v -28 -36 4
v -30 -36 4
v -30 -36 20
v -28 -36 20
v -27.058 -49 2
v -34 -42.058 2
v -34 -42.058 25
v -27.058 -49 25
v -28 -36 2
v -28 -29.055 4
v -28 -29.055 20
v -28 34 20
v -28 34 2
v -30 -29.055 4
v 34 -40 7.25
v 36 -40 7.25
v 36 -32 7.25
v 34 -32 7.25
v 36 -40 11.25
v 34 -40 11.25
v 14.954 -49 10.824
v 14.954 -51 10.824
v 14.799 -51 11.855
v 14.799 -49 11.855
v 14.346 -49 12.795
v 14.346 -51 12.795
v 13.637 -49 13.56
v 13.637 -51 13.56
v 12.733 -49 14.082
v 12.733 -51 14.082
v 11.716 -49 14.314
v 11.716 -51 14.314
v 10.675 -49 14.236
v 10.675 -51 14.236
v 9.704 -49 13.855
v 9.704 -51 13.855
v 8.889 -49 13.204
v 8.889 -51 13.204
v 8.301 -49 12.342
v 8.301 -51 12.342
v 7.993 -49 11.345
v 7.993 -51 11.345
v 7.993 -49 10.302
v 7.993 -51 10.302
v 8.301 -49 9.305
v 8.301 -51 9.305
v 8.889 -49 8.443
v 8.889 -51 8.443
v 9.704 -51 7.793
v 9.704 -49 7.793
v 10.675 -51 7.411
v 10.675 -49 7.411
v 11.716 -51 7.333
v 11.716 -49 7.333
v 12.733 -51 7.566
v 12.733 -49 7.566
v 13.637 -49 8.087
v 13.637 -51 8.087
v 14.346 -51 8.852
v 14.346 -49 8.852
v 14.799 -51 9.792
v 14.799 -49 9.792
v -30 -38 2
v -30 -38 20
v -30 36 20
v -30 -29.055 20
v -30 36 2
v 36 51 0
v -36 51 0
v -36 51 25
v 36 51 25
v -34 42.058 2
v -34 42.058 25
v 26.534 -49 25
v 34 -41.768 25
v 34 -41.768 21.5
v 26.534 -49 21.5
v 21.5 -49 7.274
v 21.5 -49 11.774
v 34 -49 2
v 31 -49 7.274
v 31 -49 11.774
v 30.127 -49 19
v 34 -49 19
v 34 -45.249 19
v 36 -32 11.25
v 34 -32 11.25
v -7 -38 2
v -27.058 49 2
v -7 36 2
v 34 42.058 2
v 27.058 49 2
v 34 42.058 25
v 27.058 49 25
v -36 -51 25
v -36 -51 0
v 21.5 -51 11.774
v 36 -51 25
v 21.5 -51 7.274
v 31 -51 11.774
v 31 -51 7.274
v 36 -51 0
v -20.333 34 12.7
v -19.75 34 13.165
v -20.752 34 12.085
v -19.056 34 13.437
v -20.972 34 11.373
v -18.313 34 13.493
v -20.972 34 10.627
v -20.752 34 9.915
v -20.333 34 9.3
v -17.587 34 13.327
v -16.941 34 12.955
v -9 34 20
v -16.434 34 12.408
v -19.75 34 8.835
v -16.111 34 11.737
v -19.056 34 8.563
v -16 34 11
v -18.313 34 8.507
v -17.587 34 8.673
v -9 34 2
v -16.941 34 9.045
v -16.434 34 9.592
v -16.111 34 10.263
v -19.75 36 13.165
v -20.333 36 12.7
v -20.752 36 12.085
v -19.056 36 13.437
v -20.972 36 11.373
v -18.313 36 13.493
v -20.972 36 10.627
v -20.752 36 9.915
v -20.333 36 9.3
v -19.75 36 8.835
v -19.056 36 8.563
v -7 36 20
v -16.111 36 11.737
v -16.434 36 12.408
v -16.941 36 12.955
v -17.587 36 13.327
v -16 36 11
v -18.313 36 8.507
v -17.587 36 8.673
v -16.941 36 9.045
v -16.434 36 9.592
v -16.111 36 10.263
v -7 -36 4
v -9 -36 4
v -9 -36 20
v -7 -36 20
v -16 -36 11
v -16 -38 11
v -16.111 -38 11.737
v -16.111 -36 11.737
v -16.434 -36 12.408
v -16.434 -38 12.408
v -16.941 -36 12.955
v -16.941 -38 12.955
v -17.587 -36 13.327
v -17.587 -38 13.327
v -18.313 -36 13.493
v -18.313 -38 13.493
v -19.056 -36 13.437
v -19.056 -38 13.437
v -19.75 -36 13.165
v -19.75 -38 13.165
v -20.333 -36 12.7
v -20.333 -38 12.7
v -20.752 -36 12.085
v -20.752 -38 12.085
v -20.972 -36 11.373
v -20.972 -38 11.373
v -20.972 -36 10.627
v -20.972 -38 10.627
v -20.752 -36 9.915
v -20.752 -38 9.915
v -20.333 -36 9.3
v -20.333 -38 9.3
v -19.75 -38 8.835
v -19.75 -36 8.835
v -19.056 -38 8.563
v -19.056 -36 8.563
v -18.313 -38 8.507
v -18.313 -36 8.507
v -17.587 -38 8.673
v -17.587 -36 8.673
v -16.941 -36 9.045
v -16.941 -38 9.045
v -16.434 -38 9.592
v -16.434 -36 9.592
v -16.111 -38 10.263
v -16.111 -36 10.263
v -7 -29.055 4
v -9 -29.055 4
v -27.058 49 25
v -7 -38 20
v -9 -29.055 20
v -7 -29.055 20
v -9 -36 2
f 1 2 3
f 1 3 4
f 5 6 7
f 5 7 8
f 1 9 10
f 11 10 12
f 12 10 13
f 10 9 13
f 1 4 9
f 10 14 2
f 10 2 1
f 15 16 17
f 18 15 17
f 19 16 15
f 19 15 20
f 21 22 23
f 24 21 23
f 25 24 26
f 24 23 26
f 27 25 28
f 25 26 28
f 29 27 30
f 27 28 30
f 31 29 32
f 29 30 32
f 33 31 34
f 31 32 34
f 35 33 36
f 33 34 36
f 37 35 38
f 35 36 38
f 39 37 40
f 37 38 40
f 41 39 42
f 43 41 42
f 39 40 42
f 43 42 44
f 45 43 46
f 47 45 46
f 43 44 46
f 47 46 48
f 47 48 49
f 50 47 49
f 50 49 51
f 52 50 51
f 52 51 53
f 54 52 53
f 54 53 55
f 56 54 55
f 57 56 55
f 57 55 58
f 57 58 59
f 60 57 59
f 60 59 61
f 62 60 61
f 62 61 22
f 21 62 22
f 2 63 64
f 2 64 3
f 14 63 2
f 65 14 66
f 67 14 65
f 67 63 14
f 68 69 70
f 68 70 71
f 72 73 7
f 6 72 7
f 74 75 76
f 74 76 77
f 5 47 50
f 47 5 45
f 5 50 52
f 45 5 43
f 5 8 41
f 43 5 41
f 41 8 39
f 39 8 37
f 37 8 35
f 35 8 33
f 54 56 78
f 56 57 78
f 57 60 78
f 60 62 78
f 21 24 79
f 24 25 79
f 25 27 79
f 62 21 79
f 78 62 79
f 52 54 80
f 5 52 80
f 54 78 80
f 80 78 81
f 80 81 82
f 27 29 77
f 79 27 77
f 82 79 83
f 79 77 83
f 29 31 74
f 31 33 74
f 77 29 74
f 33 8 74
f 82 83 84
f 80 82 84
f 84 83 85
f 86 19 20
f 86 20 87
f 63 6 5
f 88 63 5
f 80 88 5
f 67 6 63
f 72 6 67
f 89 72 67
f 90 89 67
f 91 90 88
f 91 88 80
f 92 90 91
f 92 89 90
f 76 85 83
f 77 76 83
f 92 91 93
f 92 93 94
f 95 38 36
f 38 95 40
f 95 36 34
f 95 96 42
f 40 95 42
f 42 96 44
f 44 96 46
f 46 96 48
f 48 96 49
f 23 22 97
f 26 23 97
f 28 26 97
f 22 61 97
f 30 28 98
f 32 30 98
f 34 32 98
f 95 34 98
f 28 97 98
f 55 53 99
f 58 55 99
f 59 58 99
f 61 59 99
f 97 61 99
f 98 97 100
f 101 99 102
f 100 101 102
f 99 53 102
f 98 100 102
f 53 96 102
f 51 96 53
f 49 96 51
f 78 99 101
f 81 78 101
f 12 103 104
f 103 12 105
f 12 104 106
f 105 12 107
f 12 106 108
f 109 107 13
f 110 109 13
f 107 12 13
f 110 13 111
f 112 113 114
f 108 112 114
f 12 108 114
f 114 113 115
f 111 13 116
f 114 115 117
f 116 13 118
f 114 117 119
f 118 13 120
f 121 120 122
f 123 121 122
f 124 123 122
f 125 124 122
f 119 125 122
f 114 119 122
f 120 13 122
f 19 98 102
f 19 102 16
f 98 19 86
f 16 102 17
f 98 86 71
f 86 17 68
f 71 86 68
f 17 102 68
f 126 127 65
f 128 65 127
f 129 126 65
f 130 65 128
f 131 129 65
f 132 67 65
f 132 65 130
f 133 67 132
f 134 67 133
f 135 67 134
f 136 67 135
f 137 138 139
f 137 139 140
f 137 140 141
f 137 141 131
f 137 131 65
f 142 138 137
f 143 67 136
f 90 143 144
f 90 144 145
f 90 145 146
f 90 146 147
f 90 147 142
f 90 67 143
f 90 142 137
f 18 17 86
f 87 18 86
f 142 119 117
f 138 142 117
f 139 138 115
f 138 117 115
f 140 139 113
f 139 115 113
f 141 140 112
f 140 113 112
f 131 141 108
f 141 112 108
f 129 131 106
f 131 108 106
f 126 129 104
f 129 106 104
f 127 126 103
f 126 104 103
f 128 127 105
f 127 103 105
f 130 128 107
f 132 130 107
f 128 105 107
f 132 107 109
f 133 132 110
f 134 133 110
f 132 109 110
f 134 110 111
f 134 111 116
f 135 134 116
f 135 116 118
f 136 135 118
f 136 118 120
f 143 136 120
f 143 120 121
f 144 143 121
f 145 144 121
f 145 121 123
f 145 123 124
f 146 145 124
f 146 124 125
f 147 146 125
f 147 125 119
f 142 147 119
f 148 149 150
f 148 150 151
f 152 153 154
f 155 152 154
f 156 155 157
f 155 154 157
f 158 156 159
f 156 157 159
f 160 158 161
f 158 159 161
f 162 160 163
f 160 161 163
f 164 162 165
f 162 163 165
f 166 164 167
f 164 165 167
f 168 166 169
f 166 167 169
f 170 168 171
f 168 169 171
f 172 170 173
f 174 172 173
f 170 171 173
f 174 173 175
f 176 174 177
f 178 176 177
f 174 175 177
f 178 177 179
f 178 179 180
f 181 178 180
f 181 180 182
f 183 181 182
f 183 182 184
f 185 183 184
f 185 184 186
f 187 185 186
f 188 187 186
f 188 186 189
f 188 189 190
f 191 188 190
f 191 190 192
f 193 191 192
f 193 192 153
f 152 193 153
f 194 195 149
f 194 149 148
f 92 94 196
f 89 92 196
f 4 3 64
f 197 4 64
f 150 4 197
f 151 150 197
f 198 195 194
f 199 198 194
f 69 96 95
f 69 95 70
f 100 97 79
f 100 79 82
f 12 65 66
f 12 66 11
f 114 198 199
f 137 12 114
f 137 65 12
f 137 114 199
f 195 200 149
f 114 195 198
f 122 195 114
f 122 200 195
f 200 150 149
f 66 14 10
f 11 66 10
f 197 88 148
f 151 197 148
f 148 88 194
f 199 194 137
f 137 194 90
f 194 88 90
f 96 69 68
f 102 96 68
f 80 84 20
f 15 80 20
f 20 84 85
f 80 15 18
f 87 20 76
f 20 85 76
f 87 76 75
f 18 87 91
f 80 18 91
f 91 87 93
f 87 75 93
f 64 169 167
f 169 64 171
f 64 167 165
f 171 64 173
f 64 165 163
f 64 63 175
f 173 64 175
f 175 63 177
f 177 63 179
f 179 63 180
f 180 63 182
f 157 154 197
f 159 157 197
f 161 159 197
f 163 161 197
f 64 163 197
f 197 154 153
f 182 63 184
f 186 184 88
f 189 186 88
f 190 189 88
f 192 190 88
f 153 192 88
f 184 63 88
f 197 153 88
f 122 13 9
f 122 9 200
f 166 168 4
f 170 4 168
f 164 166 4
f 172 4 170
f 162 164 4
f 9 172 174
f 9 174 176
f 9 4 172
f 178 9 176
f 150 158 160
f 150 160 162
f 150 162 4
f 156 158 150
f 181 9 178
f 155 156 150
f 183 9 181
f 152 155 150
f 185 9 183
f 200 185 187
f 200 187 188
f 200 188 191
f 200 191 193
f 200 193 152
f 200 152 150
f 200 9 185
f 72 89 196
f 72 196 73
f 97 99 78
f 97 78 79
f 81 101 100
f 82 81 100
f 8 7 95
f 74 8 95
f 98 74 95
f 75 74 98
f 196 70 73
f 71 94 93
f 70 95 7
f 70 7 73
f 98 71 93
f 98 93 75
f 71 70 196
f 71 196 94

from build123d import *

# Parameters (mm, degrees)
F0_W      = 72
F0_H      = 102
F1_DEPTH  = 25
F3_DEPTH  = 23
F4_W      = 9.5
F4_H      = 4.5
F4_R      = 3.5
F5_DEPTH  = 3
F6_DEPTH  = 3
F7_W      = 8
F7_H      = 4
F8_DEPTH  = 3
F10_W     = 23
F10_H     = 74
F10_W_2   = 19
F10_H_2   = 70
F11_DEPTH = 18
F12_W     = 2
F12_H     = 6.944833
F13_DEPTH = 16
F14_R     = 2.5
F15_DEPTH = 75
F17_DEPTH = 6
F18_SIZE  = 2.5


with BuildPart() as f1:
    # F0 (on Top) → F1 (new body)
    with BuildSketch(Plane.XY):
        Rectangle(F0_W, F0_H)
    extrude(amount=F1_DEPTH)

    # F2 (on face) → F3 (cut)
    with BuildSketch(Plane.XY.offset(25)):
        Polygon((34, 42.058192), (27.058192, 49), (-27.058192, 49), (-34, 42.058192), (-34, -42.058192), (-27.058192, -49), (34, -49), align=None)
    extrude(amount=-F3_DEPTH, mode=Mode.SUBTRACT)

    # F4 (on face) → F5 (cut)
    with BuildSketch(Plane.XZ.offset(51)):
        with Locations((26.25, 9.523708)):
            Rectangle(F4_W, F4_H)
        with Locations((11.4543, 10.823708)):
            Circle(F4_R)
    extrude(amount=-F5_DEPTH, mode=Mode.SUBTRACT)

    # F4 (on face) → F6 (cut)
    with BuildSketch(Plane.XZ.offset(51)):
        with Locations((26.25, 9.523708)):
            Rectangle(F4_W, F4_H)
        with Locations((11.4543, 10.823708)):
            Circle(F4_R)
    extrude(amount=-F6_DEPTH, mode=Mode.SUBTRACT)

    # F7 (on face) → F8 (cut)
    with BuildSketch(Plane.YZ.offset(36)):
        with Locations((-36, 9.25)):
            Rectangle(F7_W, F7_H)
    extrude(amount=-F8_DEPTH, mode=Mode.SUBTRACT)

    # F10 (on face) → F11 (join)
    with BuildSketch(Plane.XY.offset(2)):
        with Locations((-18.5, -1)):
            Rectangle(F10_W, F10_H)
        with Locations((-18.5, -1)):
            Rectangle(F10_W_2, F10_H_2, mode=Mode.SUBTRACT)
    extrude(amount=F11_DEPTH)

    # F12 (on face) → F13 (cut)
    with BuildSketch(Plane.XY.offset(20)):
        with Locations((-29, -32.527583)):
            Rectangle(F12_W, F12_H)
        with Locations((-8, -32.527583)):
            Rectangle(F12_W, F12_H)
    extrude(amount=-F13_DEPTH, mode=Mode.SUBTRACT)

    # F14 (on face) → F15 (cut)
    with BuildSketch(Plane.XZ.offset(38)):
        with Locations((-18.5, 11)):
            Circle(F14_R)
    extrude(amount=-F15_DEPTH, mode=Mode.SUBTRACT)

    # F16 (on face) → F17 (join)
    with BuildSketch(Plane.XY.offset(25)):
        Polygon((34, -41.767824), (26.534403, -49), (34, -49), align=None)
    extrude(amount=-F17_DEPTH)

    # F18
    f18_edges = [f1.edges().sort_by_distance(p)[0] for p in [
        (30.267201, -45.383912, 19),
    ]]
    chamfer(f18_edges, length=F18_SIZE)


solid = f1.part
